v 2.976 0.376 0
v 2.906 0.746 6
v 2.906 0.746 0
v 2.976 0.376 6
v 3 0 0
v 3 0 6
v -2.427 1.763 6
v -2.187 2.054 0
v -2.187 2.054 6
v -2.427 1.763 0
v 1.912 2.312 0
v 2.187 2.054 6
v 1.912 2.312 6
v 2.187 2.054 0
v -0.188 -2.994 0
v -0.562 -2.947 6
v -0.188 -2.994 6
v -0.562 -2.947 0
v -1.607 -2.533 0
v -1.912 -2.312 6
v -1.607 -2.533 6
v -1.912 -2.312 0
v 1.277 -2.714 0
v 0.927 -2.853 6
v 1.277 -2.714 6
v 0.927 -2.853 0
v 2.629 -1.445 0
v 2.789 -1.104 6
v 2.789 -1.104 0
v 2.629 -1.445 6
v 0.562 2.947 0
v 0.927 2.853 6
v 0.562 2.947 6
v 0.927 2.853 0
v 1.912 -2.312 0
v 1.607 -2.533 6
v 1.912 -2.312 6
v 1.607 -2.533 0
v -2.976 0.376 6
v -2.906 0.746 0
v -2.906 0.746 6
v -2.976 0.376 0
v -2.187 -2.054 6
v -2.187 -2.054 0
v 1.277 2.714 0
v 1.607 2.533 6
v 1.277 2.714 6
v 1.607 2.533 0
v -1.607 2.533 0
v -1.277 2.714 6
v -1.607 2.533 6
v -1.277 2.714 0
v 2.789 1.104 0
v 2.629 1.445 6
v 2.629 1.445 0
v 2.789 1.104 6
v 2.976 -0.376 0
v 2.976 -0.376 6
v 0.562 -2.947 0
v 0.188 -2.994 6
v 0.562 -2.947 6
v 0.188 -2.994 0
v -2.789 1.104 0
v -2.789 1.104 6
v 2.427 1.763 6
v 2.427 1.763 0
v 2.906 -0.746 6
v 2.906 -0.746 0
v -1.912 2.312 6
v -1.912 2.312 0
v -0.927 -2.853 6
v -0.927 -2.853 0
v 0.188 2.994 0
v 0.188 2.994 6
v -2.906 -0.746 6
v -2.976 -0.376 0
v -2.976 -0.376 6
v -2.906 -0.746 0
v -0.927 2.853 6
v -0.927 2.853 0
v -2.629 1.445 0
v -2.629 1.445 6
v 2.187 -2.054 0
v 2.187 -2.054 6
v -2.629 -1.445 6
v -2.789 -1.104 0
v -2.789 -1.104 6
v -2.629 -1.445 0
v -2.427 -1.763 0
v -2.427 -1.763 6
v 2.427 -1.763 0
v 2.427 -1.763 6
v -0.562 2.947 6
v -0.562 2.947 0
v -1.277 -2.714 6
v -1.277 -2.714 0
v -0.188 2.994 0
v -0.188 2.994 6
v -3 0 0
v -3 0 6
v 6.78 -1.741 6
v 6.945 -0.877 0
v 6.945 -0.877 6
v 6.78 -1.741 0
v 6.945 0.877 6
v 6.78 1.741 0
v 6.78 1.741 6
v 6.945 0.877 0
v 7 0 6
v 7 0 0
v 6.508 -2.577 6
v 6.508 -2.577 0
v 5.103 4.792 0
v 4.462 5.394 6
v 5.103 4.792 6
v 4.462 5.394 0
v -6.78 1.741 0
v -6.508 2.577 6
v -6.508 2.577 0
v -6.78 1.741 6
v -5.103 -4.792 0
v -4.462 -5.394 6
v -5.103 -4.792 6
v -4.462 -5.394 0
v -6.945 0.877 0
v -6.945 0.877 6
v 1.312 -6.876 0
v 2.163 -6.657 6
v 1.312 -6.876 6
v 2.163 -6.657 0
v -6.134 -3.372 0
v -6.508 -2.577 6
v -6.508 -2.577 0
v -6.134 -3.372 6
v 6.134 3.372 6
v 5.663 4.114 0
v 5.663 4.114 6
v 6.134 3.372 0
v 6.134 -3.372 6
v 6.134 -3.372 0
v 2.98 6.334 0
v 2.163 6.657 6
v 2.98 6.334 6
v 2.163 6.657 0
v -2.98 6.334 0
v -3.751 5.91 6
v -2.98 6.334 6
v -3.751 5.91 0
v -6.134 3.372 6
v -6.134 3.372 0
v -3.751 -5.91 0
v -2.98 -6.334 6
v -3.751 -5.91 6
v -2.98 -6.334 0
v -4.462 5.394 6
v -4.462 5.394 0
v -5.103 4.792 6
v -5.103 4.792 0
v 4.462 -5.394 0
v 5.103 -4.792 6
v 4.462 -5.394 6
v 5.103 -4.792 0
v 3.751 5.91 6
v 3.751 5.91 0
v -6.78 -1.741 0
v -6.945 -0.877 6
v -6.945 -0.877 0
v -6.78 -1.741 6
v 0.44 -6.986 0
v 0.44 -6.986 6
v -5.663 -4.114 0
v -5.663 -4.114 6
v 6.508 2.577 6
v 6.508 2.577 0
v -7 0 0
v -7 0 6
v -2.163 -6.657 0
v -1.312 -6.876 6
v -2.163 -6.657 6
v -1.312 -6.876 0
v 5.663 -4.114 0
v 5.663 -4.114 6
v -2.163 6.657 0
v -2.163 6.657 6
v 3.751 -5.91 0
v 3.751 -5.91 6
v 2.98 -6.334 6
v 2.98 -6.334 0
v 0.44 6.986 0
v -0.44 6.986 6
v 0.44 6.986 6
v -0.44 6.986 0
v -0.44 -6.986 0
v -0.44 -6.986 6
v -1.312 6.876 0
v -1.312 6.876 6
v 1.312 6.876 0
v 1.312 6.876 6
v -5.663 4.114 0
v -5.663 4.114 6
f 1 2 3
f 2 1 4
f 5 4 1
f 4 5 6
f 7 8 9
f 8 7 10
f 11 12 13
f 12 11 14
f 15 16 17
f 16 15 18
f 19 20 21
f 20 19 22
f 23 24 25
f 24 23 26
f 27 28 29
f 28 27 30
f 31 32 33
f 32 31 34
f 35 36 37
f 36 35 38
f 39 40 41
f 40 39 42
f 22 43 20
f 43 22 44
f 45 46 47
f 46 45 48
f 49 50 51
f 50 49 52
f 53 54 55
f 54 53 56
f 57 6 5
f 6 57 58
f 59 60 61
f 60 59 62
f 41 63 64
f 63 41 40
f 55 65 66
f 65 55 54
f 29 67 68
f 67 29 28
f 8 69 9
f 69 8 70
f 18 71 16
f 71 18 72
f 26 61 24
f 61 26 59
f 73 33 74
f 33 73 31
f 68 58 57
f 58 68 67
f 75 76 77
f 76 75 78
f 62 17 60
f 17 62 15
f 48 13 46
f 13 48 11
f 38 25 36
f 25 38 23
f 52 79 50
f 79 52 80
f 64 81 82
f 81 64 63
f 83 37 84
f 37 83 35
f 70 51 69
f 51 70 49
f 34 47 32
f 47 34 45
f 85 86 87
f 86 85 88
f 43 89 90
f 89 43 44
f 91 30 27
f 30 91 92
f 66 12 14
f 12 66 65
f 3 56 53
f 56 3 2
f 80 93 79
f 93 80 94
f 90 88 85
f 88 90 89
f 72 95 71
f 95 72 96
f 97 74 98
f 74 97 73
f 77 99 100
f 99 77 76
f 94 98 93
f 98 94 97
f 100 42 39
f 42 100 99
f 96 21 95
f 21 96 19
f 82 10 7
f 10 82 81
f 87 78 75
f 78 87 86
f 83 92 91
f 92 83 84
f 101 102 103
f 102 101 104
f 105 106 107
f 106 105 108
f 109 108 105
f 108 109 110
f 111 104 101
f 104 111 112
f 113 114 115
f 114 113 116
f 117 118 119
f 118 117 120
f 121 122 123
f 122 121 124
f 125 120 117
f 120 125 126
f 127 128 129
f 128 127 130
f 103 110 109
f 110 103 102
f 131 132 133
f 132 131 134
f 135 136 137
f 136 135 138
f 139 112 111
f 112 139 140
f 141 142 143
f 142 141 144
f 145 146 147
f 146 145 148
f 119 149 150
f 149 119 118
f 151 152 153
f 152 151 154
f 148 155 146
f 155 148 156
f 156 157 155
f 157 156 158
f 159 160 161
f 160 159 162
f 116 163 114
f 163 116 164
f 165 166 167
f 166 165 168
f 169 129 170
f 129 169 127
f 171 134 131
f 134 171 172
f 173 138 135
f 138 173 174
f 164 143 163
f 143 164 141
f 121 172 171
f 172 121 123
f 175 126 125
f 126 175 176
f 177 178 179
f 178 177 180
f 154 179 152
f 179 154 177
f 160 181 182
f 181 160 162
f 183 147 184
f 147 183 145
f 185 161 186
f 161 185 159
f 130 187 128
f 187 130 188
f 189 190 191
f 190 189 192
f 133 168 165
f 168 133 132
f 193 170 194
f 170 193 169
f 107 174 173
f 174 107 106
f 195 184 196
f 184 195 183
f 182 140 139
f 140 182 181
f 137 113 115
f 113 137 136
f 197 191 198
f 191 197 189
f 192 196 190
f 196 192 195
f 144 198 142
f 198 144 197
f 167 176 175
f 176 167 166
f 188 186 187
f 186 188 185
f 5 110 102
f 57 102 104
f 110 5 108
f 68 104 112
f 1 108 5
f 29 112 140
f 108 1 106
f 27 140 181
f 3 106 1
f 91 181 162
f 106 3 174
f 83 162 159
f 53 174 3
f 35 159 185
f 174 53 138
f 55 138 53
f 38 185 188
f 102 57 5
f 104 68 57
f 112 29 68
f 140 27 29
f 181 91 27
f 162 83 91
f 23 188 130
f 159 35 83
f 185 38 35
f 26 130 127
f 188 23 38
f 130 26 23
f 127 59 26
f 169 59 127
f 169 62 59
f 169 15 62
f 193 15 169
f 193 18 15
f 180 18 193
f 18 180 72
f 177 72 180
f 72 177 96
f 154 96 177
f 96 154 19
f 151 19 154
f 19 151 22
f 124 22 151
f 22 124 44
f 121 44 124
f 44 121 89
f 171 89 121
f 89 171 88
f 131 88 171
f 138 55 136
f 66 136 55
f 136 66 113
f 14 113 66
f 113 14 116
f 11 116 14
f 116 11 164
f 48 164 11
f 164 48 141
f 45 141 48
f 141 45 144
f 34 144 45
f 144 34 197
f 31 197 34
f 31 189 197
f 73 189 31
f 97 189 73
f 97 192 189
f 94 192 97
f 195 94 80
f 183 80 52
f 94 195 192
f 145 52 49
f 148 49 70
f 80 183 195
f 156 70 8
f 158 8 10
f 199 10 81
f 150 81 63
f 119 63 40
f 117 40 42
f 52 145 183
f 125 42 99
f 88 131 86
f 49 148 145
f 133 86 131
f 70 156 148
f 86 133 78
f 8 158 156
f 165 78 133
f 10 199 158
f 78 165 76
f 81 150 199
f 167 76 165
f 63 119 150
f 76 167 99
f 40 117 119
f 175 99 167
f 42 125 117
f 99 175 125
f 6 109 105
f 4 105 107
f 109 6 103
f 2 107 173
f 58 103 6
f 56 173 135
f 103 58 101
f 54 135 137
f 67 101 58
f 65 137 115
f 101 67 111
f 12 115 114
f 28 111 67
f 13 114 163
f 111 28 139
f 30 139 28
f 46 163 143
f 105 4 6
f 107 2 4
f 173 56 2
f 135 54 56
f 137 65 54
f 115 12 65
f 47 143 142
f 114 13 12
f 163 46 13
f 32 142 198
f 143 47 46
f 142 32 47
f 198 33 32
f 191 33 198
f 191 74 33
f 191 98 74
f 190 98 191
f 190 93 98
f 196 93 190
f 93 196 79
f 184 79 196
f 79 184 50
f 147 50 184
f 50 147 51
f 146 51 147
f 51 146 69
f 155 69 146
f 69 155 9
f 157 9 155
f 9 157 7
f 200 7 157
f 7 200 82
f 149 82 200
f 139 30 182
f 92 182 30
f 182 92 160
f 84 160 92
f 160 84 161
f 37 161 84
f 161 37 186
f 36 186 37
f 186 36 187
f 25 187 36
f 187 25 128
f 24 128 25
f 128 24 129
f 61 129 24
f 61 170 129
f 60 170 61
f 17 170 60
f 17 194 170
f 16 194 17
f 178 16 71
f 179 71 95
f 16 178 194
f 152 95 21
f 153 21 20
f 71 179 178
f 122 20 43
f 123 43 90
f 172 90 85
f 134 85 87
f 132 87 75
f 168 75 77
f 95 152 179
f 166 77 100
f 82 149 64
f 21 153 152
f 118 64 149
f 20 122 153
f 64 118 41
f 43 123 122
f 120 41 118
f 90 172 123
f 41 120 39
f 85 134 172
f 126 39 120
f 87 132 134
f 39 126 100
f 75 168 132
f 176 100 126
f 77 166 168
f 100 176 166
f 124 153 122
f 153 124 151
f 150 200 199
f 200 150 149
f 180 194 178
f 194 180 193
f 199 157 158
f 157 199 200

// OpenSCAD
$fn = 50;


difference() {
	union() {
		cylinder(h = 6, r = 7.0000000000);
	}
	union() {
		#translate(v = [0.0000000000, 0.0000000000, -100.0000000000]) {
			cylinder(h = 200, r = 3.0000000000);
		}
		#translate(v = [0.0000000000, 0.0000000000, -100.0000000000]) {
			cylinder(h = 200, r = 3.0000000000);
		}
		#translate(v = [0.0000000000, 0.0000000000, -100.0000000000]) {
			cylinder(h = 200, r = 3.0000000000);
		}
		#translate(v = [0.0000000000, 0.0000000000, -100.0000000000]) {
			cylinder(h = 200, r = 3.0000000000);
		}
		#cylinder(h = 6, r = 2.5000000000);
	}
}
